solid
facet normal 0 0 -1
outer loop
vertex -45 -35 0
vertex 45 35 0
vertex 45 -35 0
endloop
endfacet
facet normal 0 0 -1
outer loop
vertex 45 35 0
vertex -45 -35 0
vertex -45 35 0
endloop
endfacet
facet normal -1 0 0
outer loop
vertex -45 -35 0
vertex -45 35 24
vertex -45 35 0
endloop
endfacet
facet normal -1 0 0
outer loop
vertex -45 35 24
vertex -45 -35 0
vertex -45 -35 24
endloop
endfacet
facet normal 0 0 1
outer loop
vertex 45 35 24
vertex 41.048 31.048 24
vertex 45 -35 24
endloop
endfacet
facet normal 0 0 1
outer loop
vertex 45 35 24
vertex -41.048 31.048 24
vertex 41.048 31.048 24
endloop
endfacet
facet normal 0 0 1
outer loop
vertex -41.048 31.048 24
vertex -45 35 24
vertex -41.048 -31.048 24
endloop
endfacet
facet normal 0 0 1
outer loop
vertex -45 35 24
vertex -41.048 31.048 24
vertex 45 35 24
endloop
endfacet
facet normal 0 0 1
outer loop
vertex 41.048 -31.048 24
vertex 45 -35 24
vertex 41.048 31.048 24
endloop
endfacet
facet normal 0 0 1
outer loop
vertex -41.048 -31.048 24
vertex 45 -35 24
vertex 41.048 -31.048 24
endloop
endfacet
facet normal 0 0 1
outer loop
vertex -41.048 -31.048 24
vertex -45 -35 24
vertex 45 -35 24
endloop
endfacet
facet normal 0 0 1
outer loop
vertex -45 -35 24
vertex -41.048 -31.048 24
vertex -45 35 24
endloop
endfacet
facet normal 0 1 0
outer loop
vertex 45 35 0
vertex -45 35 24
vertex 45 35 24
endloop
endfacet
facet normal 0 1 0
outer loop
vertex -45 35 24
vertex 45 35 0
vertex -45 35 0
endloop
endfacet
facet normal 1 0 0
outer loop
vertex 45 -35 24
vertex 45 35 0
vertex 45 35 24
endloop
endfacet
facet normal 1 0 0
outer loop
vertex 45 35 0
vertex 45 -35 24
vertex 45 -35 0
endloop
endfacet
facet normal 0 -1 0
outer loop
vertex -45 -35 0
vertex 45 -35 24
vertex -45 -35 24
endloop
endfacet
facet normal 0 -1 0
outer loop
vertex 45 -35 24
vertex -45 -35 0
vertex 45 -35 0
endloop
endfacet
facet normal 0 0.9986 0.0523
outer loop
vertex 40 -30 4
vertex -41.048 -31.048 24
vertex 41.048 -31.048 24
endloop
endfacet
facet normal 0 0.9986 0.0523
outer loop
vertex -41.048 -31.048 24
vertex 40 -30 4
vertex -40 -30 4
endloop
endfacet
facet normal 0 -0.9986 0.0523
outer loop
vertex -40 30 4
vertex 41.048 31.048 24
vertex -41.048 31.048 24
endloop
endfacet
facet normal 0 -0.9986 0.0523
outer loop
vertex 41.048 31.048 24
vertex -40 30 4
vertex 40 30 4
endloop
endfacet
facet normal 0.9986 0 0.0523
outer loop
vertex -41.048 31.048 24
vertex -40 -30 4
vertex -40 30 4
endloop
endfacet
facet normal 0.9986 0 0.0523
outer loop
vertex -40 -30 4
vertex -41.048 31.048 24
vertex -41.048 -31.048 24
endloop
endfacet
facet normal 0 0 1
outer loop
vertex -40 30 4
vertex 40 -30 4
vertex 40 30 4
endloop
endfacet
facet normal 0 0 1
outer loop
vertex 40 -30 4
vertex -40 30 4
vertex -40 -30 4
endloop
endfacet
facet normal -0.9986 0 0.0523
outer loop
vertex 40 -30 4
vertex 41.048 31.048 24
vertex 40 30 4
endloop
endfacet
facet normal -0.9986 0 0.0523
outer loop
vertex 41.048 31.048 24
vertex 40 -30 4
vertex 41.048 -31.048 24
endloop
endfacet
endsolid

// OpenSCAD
// Workflow B: Reusable Silicone Mold Box (Parametric Frame)
// All variables below are overridden at compile time via `-D name=value`
// from the backend. Defaults here only matter when opening this file
// directly in the OpenSCAD GUI for template development.

mold_inner_length_x = 80;
mold_inner_width_y  = 60;
mold_inner_depth_z  = 20;
wall_thickness      = 5;
floor_thickness     = 4;
draft_angle         = 3;
enable_center_guide = false;
guide_length_x      = 20;
guide_width_y       = 15;

$fn = 96;

// Cavity tapers outward from bottom to top so a cured silicone block (or a
// printed positive) releases without undercuts.
module cavity() {
  taper_x = 2 * mold_inner_depth_z * tan(draft_angle);
  taper_y = 2 * mold_inner_depth_z * tan(draft_angle);

  hull() {
    linear_extrude(height = 0.01)
      square([mold_inner_length_x, mold_inner_width_y], center = true);
    translate([0, 0, mold_inner_depth_z])
      linear_extrude(height = 0.01)
        square([mold_inner_length_x + taper_x, mold_inner_width_y + taper_y], center = true);
  }
}

// A raised locating boss standing up from the cavity floor, useful for
// keying a two-part pour or registering a second mold half.
module center_guide() {
  guide_height = mold_inner_depth_z * 0.3;
  linear_extrude(height = guide_height)
    square([guide_length_x, guide_width_y], center = true);
}

outer_l = mold_inner_length_x + 2 * wall_thickness;
outer_w = mold_inner_width_y + 2 * wall_thickness;
outer_h = floor_thickness + mold_inner_depth_z;

union() {
  difference() {
    linear_extrude(height = outer_h)
      square([outer_l, outer_w], center = true);

    translate([0, 0, floor_thickness])
      cavity();
  }

  if (enable_center_guide) {
    translate([0, 0, floor_thickness])
      center_guide();
  }
}
